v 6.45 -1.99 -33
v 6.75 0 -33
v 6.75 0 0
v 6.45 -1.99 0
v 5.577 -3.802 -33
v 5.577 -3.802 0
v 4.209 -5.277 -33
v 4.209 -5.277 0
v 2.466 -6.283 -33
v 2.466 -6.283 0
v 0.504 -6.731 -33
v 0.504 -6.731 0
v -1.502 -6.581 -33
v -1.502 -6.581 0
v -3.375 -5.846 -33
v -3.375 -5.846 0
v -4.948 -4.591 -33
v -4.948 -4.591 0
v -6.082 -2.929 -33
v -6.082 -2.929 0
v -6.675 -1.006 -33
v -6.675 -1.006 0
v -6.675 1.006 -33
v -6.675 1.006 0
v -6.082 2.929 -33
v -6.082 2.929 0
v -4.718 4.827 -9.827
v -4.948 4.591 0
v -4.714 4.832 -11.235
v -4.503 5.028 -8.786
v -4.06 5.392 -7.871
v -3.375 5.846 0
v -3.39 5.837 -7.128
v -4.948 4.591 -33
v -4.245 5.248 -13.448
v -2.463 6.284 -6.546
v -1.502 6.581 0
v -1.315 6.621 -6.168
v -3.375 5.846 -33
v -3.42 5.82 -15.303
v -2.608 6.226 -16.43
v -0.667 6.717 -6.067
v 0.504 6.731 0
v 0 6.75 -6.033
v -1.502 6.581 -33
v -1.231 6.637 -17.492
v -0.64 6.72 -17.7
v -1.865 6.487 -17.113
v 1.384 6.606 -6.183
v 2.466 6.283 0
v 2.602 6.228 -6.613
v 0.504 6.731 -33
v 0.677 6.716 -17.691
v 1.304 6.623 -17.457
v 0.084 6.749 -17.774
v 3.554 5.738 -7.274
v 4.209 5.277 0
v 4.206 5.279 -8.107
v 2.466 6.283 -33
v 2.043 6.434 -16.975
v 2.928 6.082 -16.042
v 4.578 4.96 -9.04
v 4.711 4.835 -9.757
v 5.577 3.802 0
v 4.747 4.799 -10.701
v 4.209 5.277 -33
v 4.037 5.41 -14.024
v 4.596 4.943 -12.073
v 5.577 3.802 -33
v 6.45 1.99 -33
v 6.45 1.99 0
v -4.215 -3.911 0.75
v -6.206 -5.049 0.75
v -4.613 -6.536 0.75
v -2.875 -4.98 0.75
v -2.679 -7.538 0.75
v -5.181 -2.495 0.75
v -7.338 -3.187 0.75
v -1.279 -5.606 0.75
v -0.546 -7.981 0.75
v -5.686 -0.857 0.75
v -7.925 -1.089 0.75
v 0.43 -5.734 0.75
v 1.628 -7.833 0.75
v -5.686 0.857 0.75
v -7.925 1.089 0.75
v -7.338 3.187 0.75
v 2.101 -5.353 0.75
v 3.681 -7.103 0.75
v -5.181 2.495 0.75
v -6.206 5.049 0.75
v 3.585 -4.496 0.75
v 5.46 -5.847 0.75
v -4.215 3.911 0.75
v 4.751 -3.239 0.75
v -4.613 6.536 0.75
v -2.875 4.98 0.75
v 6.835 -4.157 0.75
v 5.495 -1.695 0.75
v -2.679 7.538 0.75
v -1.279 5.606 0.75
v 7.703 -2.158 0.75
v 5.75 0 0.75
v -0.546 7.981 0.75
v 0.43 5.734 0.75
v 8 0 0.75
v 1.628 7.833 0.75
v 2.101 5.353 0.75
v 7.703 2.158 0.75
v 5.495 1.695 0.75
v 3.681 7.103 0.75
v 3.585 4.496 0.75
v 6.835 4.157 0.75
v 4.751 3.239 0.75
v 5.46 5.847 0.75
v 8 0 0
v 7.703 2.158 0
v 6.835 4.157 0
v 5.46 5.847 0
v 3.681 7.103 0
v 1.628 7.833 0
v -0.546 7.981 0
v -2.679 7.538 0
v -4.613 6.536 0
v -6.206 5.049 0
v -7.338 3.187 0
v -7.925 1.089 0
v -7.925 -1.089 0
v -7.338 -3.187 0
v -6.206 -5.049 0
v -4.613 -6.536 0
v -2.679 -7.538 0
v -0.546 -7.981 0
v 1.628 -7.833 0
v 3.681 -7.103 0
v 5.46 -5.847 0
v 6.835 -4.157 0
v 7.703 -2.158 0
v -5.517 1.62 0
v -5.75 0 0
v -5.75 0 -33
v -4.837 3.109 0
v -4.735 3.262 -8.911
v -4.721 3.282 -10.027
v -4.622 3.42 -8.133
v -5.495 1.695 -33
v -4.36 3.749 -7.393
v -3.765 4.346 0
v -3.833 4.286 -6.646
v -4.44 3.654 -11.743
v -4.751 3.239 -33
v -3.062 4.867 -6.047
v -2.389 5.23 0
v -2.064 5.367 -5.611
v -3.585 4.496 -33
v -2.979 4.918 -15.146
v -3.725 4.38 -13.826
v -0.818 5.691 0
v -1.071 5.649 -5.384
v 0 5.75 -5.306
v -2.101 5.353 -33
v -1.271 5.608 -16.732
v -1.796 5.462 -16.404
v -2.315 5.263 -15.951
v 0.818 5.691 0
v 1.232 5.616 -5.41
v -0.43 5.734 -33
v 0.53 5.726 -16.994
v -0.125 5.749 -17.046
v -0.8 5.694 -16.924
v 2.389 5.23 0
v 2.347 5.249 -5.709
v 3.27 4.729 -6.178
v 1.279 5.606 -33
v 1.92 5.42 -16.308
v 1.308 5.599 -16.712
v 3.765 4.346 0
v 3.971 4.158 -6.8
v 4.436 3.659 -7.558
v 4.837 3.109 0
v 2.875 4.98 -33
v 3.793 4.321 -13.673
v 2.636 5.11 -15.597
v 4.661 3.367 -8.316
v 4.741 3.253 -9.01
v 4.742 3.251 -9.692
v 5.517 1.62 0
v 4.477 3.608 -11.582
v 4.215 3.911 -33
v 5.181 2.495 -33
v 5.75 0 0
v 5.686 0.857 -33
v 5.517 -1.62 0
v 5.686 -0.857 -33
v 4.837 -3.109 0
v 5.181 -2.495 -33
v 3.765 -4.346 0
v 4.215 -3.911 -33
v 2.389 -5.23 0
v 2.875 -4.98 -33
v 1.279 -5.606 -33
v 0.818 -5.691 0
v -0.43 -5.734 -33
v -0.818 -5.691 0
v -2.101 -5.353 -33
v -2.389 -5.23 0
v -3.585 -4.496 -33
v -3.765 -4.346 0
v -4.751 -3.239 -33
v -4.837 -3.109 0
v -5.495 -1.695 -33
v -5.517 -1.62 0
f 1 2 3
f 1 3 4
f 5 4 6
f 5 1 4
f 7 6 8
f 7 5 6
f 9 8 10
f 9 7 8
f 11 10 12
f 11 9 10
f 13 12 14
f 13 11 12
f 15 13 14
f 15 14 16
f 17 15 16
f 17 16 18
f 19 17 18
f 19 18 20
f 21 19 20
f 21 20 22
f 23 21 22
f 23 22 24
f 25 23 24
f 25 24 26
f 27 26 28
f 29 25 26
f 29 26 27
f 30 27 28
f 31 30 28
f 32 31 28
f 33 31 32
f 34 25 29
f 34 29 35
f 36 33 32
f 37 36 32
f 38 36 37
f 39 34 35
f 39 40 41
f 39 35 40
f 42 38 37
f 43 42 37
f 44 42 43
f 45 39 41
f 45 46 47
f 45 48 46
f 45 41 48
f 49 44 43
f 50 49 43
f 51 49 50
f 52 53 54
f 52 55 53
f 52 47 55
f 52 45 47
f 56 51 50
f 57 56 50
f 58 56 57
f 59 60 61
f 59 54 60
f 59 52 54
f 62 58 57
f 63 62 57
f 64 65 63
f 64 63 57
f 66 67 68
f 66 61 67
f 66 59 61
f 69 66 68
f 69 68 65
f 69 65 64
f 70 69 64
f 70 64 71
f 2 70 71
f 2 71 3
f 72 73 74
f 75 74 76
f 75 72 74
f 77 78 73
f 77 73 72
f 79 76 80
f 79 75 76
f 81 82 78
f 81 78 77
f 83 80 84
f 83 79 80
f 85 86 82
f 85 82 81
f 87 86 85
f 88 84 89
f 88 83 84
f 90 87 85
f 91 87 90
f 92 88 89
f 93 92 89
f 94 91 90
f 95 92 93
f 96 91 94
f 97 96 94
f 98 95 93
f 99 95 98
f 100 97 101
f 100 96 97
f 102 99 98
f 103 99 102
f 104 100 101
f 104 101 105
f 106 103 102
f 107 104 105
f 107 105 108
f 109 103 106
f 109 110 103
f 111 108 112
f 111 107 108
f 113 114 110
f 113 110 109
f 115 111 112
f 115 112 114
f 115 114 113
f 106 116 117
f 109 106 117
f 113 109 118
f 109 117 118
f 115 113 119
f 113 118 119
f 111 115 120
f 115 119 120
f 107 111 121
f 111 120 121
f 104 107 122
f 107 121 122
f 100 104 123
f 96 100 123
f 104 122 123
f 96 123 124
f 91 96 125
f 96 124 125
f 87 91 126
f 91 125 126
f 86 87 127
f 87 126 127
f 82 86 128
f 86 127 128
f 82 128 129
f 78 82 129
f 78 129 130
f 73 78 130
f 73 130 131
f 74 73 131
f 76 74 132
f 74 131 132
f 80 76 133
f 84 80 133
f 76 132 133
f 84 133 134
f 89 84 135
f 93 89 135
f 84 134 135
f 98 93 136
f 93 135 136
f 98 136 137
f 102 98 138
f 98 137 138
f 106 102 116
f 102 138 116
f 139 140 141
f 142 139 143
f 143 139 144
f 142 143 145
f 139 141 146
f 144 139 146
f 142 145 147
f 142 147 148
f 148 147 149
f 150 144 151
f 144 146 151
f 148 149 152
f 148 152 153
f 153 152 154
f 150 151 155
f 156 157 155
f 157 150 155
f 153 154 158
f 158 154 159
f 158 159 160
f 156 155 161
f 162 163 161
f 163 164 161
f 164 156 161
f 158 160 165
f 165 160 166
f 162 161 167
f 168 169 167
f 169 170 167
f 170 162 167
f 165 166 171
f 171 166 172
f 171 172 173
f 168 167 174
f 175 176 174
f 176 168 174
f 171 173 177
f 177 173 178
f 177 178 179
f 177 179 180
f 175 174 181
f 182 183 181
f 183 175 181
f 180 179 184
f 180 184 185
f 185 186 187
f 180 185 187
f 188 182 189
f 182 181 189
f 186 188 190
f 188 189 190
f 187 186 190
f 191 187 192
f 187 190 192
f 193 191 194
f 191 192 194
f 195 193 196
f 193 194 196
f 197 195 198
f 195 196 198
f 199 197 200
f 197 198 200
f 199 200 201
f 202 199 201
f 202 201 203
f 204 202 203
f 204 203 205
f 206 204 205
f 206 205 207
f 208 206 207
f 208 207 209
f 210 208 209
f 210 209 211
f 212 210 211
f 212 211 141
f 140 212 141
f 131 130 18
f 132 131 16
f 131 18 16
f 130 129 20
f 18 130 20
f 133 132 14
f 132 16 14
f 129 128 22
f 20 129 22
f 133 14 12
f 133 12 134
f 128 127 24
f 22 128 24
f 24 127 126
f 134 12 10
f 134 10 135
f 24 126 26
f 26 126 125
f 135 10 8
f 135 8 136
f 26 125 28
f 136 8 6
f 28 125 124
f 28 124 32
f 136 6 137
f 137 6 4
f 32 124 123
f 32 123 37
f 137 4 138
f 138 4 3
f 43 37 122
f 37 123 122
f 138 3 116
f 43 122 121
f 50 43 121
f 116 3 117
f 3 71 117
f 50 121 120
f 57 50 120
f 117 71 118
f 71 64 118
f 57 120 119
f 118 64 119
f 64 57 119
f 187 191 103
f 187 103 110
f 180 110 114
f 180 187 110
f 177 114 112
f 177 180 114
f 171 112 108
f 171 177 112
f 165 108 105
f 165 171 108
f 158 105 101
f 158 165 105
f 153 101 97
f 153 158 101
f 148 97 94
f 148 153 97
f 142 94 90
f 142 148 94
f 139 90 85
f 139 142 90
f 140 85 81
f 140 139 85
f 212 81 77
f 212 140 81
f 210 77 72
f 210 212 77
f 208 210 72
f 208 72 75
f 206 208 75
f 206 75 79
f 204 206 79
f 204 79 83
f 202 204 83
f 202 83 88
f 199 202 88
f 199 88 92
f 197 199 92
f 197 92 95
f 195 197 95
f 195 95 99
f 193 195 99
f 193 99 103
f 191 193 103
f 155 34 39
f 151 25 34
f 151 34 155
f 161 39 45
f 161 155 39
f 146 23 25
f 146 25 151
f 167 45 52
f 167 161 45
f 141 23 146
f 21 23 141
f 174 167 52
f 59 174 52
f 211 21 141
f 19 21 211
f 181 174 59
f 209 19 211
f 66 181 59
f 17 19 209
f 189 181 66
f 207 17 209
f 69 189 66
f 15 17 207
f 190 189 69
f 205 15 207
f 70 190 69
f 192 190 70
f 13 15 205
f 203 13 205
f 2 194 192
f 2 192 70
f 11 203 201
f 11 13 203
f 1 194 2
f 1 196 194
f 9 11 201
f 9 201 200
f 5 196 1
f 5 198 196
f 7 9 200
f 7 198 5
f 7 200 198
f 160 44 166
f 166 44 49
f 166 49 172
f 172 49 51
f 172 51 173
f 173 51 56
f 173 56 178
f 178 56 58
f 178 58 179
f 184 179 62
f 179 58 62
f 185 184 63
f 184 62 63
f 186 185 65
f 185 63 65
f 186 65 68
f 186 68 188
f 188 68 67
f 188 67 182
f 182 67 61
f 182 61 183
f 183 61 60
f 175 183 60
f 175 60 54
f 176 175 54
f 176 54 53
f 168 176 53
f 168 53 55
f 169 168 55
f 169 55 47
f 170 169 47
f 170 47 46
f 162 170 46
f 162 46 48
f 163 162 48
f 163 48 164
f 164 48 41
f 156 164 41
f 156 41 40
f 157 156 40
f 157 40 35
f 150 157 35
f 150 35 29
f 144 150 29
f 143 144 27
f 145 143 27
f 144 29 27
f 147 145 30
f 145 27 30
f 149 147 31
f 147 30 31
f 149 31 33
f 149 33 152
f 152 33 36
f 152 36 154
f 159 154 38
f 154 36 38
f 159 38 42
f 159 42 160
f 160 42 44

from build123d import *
from build123d.topology import SkipClean

# Parameters (mm, degrees)
ESQUISSE1_R                  = 8
ESQUISSE1_R_2                = 5.75
BASE_EXTRUSION_DEPTH         = 0.75
BOSS_EXTRU_1_START           = 33
ESQUISSE2_R                  = 6.75
ESQUISSE2_R_2                = 5.75
BOSS_EXTRU_1_DEPTH           = 33
ENL_V_MAT_EXTRU_1_REACH      = 34.989
ENL_V_MAT_EXTRU_1_END_RADIUS = 5.75
ESQUISSE3_R                  = 4.75


with BuildPart() as part:
    # Esquisse1 → Base-Extrusion (new body)
    with BuildSketch(Plane.XY):
        Circle(ESQUISSE1_R)
        Circle(ESQUISSE1_R_2, mode=Mode.SUBTRACT)
    extrude(amount=BASE_EXTRUSION_DEPTH)

    # Esquisse2 → Boss.-Extru.1 (add)
    with SkipClean():  # the faces are left unmerged after this step: merging them gives an invalid solid
        with BuildSketch(Plane(origin=(0, 0, 0), x_dir=(-1, 0, 0), z_dir=(0, 0, -1)).offset(BOSS_EXTRU_1_START)):
            with Locations(Location((0, 0, 0), (0, 0, 180))):
                Circle(ESQUISSE2_R)
            Circle(ESQUISSE2_R_2, mode=Mode.SUBTRACT)
        extrude(amount=-BOSS_EXTRU_1_DEPTH)

    # Enlèv. mat.-Extru.1: up to this cylinder (the profile starts outside it)
    with SkipClean():  # the faces are left unmerged after this step: merging them gives an invalid solid
        enl_v_mat_extru_1_end = Plane(origin=(0, 0, -15.816779), z_dir=(0, 0, -1)) * Cylinder(ENL_V_MAT_EXTRU_1_END_RADIUS, 82.478, mode=Mode.PRIVATE)
        # Esquisse3 → Enlèv. mat.-Extru.1 (cut, up to the surface)
        with BuildSketch(Plane(origin=(0, 15.463952723, -11.235219304), x_dir=(-1, 0, 0), z_dir=(0, 0.8090169943749307, -0.5877852522924963)), mode=Mode.PRIVATE) as enl_v_mat_extru_1_sk1:
            with Locations(Location((0, -5.663118961, 0), (0, 0, 90))):
                Circle(ESQUISSE3_R)
        enl_v_mat_extru_1_tool1 = extrude(enl_v_mat_extru_1_sk1.sketch, amount=-ENL_V_MAT_EXTRU_1_REACH, mode=Mode.PRIVATE) - enl_v_mat_extru_1_end
        add(enl_v_mat_extru_1_tool1.solids().sort_by_distance((0, 12.135255, -15.816779))[0], mode=Mode.SUBTRACT)


solid = part.part
